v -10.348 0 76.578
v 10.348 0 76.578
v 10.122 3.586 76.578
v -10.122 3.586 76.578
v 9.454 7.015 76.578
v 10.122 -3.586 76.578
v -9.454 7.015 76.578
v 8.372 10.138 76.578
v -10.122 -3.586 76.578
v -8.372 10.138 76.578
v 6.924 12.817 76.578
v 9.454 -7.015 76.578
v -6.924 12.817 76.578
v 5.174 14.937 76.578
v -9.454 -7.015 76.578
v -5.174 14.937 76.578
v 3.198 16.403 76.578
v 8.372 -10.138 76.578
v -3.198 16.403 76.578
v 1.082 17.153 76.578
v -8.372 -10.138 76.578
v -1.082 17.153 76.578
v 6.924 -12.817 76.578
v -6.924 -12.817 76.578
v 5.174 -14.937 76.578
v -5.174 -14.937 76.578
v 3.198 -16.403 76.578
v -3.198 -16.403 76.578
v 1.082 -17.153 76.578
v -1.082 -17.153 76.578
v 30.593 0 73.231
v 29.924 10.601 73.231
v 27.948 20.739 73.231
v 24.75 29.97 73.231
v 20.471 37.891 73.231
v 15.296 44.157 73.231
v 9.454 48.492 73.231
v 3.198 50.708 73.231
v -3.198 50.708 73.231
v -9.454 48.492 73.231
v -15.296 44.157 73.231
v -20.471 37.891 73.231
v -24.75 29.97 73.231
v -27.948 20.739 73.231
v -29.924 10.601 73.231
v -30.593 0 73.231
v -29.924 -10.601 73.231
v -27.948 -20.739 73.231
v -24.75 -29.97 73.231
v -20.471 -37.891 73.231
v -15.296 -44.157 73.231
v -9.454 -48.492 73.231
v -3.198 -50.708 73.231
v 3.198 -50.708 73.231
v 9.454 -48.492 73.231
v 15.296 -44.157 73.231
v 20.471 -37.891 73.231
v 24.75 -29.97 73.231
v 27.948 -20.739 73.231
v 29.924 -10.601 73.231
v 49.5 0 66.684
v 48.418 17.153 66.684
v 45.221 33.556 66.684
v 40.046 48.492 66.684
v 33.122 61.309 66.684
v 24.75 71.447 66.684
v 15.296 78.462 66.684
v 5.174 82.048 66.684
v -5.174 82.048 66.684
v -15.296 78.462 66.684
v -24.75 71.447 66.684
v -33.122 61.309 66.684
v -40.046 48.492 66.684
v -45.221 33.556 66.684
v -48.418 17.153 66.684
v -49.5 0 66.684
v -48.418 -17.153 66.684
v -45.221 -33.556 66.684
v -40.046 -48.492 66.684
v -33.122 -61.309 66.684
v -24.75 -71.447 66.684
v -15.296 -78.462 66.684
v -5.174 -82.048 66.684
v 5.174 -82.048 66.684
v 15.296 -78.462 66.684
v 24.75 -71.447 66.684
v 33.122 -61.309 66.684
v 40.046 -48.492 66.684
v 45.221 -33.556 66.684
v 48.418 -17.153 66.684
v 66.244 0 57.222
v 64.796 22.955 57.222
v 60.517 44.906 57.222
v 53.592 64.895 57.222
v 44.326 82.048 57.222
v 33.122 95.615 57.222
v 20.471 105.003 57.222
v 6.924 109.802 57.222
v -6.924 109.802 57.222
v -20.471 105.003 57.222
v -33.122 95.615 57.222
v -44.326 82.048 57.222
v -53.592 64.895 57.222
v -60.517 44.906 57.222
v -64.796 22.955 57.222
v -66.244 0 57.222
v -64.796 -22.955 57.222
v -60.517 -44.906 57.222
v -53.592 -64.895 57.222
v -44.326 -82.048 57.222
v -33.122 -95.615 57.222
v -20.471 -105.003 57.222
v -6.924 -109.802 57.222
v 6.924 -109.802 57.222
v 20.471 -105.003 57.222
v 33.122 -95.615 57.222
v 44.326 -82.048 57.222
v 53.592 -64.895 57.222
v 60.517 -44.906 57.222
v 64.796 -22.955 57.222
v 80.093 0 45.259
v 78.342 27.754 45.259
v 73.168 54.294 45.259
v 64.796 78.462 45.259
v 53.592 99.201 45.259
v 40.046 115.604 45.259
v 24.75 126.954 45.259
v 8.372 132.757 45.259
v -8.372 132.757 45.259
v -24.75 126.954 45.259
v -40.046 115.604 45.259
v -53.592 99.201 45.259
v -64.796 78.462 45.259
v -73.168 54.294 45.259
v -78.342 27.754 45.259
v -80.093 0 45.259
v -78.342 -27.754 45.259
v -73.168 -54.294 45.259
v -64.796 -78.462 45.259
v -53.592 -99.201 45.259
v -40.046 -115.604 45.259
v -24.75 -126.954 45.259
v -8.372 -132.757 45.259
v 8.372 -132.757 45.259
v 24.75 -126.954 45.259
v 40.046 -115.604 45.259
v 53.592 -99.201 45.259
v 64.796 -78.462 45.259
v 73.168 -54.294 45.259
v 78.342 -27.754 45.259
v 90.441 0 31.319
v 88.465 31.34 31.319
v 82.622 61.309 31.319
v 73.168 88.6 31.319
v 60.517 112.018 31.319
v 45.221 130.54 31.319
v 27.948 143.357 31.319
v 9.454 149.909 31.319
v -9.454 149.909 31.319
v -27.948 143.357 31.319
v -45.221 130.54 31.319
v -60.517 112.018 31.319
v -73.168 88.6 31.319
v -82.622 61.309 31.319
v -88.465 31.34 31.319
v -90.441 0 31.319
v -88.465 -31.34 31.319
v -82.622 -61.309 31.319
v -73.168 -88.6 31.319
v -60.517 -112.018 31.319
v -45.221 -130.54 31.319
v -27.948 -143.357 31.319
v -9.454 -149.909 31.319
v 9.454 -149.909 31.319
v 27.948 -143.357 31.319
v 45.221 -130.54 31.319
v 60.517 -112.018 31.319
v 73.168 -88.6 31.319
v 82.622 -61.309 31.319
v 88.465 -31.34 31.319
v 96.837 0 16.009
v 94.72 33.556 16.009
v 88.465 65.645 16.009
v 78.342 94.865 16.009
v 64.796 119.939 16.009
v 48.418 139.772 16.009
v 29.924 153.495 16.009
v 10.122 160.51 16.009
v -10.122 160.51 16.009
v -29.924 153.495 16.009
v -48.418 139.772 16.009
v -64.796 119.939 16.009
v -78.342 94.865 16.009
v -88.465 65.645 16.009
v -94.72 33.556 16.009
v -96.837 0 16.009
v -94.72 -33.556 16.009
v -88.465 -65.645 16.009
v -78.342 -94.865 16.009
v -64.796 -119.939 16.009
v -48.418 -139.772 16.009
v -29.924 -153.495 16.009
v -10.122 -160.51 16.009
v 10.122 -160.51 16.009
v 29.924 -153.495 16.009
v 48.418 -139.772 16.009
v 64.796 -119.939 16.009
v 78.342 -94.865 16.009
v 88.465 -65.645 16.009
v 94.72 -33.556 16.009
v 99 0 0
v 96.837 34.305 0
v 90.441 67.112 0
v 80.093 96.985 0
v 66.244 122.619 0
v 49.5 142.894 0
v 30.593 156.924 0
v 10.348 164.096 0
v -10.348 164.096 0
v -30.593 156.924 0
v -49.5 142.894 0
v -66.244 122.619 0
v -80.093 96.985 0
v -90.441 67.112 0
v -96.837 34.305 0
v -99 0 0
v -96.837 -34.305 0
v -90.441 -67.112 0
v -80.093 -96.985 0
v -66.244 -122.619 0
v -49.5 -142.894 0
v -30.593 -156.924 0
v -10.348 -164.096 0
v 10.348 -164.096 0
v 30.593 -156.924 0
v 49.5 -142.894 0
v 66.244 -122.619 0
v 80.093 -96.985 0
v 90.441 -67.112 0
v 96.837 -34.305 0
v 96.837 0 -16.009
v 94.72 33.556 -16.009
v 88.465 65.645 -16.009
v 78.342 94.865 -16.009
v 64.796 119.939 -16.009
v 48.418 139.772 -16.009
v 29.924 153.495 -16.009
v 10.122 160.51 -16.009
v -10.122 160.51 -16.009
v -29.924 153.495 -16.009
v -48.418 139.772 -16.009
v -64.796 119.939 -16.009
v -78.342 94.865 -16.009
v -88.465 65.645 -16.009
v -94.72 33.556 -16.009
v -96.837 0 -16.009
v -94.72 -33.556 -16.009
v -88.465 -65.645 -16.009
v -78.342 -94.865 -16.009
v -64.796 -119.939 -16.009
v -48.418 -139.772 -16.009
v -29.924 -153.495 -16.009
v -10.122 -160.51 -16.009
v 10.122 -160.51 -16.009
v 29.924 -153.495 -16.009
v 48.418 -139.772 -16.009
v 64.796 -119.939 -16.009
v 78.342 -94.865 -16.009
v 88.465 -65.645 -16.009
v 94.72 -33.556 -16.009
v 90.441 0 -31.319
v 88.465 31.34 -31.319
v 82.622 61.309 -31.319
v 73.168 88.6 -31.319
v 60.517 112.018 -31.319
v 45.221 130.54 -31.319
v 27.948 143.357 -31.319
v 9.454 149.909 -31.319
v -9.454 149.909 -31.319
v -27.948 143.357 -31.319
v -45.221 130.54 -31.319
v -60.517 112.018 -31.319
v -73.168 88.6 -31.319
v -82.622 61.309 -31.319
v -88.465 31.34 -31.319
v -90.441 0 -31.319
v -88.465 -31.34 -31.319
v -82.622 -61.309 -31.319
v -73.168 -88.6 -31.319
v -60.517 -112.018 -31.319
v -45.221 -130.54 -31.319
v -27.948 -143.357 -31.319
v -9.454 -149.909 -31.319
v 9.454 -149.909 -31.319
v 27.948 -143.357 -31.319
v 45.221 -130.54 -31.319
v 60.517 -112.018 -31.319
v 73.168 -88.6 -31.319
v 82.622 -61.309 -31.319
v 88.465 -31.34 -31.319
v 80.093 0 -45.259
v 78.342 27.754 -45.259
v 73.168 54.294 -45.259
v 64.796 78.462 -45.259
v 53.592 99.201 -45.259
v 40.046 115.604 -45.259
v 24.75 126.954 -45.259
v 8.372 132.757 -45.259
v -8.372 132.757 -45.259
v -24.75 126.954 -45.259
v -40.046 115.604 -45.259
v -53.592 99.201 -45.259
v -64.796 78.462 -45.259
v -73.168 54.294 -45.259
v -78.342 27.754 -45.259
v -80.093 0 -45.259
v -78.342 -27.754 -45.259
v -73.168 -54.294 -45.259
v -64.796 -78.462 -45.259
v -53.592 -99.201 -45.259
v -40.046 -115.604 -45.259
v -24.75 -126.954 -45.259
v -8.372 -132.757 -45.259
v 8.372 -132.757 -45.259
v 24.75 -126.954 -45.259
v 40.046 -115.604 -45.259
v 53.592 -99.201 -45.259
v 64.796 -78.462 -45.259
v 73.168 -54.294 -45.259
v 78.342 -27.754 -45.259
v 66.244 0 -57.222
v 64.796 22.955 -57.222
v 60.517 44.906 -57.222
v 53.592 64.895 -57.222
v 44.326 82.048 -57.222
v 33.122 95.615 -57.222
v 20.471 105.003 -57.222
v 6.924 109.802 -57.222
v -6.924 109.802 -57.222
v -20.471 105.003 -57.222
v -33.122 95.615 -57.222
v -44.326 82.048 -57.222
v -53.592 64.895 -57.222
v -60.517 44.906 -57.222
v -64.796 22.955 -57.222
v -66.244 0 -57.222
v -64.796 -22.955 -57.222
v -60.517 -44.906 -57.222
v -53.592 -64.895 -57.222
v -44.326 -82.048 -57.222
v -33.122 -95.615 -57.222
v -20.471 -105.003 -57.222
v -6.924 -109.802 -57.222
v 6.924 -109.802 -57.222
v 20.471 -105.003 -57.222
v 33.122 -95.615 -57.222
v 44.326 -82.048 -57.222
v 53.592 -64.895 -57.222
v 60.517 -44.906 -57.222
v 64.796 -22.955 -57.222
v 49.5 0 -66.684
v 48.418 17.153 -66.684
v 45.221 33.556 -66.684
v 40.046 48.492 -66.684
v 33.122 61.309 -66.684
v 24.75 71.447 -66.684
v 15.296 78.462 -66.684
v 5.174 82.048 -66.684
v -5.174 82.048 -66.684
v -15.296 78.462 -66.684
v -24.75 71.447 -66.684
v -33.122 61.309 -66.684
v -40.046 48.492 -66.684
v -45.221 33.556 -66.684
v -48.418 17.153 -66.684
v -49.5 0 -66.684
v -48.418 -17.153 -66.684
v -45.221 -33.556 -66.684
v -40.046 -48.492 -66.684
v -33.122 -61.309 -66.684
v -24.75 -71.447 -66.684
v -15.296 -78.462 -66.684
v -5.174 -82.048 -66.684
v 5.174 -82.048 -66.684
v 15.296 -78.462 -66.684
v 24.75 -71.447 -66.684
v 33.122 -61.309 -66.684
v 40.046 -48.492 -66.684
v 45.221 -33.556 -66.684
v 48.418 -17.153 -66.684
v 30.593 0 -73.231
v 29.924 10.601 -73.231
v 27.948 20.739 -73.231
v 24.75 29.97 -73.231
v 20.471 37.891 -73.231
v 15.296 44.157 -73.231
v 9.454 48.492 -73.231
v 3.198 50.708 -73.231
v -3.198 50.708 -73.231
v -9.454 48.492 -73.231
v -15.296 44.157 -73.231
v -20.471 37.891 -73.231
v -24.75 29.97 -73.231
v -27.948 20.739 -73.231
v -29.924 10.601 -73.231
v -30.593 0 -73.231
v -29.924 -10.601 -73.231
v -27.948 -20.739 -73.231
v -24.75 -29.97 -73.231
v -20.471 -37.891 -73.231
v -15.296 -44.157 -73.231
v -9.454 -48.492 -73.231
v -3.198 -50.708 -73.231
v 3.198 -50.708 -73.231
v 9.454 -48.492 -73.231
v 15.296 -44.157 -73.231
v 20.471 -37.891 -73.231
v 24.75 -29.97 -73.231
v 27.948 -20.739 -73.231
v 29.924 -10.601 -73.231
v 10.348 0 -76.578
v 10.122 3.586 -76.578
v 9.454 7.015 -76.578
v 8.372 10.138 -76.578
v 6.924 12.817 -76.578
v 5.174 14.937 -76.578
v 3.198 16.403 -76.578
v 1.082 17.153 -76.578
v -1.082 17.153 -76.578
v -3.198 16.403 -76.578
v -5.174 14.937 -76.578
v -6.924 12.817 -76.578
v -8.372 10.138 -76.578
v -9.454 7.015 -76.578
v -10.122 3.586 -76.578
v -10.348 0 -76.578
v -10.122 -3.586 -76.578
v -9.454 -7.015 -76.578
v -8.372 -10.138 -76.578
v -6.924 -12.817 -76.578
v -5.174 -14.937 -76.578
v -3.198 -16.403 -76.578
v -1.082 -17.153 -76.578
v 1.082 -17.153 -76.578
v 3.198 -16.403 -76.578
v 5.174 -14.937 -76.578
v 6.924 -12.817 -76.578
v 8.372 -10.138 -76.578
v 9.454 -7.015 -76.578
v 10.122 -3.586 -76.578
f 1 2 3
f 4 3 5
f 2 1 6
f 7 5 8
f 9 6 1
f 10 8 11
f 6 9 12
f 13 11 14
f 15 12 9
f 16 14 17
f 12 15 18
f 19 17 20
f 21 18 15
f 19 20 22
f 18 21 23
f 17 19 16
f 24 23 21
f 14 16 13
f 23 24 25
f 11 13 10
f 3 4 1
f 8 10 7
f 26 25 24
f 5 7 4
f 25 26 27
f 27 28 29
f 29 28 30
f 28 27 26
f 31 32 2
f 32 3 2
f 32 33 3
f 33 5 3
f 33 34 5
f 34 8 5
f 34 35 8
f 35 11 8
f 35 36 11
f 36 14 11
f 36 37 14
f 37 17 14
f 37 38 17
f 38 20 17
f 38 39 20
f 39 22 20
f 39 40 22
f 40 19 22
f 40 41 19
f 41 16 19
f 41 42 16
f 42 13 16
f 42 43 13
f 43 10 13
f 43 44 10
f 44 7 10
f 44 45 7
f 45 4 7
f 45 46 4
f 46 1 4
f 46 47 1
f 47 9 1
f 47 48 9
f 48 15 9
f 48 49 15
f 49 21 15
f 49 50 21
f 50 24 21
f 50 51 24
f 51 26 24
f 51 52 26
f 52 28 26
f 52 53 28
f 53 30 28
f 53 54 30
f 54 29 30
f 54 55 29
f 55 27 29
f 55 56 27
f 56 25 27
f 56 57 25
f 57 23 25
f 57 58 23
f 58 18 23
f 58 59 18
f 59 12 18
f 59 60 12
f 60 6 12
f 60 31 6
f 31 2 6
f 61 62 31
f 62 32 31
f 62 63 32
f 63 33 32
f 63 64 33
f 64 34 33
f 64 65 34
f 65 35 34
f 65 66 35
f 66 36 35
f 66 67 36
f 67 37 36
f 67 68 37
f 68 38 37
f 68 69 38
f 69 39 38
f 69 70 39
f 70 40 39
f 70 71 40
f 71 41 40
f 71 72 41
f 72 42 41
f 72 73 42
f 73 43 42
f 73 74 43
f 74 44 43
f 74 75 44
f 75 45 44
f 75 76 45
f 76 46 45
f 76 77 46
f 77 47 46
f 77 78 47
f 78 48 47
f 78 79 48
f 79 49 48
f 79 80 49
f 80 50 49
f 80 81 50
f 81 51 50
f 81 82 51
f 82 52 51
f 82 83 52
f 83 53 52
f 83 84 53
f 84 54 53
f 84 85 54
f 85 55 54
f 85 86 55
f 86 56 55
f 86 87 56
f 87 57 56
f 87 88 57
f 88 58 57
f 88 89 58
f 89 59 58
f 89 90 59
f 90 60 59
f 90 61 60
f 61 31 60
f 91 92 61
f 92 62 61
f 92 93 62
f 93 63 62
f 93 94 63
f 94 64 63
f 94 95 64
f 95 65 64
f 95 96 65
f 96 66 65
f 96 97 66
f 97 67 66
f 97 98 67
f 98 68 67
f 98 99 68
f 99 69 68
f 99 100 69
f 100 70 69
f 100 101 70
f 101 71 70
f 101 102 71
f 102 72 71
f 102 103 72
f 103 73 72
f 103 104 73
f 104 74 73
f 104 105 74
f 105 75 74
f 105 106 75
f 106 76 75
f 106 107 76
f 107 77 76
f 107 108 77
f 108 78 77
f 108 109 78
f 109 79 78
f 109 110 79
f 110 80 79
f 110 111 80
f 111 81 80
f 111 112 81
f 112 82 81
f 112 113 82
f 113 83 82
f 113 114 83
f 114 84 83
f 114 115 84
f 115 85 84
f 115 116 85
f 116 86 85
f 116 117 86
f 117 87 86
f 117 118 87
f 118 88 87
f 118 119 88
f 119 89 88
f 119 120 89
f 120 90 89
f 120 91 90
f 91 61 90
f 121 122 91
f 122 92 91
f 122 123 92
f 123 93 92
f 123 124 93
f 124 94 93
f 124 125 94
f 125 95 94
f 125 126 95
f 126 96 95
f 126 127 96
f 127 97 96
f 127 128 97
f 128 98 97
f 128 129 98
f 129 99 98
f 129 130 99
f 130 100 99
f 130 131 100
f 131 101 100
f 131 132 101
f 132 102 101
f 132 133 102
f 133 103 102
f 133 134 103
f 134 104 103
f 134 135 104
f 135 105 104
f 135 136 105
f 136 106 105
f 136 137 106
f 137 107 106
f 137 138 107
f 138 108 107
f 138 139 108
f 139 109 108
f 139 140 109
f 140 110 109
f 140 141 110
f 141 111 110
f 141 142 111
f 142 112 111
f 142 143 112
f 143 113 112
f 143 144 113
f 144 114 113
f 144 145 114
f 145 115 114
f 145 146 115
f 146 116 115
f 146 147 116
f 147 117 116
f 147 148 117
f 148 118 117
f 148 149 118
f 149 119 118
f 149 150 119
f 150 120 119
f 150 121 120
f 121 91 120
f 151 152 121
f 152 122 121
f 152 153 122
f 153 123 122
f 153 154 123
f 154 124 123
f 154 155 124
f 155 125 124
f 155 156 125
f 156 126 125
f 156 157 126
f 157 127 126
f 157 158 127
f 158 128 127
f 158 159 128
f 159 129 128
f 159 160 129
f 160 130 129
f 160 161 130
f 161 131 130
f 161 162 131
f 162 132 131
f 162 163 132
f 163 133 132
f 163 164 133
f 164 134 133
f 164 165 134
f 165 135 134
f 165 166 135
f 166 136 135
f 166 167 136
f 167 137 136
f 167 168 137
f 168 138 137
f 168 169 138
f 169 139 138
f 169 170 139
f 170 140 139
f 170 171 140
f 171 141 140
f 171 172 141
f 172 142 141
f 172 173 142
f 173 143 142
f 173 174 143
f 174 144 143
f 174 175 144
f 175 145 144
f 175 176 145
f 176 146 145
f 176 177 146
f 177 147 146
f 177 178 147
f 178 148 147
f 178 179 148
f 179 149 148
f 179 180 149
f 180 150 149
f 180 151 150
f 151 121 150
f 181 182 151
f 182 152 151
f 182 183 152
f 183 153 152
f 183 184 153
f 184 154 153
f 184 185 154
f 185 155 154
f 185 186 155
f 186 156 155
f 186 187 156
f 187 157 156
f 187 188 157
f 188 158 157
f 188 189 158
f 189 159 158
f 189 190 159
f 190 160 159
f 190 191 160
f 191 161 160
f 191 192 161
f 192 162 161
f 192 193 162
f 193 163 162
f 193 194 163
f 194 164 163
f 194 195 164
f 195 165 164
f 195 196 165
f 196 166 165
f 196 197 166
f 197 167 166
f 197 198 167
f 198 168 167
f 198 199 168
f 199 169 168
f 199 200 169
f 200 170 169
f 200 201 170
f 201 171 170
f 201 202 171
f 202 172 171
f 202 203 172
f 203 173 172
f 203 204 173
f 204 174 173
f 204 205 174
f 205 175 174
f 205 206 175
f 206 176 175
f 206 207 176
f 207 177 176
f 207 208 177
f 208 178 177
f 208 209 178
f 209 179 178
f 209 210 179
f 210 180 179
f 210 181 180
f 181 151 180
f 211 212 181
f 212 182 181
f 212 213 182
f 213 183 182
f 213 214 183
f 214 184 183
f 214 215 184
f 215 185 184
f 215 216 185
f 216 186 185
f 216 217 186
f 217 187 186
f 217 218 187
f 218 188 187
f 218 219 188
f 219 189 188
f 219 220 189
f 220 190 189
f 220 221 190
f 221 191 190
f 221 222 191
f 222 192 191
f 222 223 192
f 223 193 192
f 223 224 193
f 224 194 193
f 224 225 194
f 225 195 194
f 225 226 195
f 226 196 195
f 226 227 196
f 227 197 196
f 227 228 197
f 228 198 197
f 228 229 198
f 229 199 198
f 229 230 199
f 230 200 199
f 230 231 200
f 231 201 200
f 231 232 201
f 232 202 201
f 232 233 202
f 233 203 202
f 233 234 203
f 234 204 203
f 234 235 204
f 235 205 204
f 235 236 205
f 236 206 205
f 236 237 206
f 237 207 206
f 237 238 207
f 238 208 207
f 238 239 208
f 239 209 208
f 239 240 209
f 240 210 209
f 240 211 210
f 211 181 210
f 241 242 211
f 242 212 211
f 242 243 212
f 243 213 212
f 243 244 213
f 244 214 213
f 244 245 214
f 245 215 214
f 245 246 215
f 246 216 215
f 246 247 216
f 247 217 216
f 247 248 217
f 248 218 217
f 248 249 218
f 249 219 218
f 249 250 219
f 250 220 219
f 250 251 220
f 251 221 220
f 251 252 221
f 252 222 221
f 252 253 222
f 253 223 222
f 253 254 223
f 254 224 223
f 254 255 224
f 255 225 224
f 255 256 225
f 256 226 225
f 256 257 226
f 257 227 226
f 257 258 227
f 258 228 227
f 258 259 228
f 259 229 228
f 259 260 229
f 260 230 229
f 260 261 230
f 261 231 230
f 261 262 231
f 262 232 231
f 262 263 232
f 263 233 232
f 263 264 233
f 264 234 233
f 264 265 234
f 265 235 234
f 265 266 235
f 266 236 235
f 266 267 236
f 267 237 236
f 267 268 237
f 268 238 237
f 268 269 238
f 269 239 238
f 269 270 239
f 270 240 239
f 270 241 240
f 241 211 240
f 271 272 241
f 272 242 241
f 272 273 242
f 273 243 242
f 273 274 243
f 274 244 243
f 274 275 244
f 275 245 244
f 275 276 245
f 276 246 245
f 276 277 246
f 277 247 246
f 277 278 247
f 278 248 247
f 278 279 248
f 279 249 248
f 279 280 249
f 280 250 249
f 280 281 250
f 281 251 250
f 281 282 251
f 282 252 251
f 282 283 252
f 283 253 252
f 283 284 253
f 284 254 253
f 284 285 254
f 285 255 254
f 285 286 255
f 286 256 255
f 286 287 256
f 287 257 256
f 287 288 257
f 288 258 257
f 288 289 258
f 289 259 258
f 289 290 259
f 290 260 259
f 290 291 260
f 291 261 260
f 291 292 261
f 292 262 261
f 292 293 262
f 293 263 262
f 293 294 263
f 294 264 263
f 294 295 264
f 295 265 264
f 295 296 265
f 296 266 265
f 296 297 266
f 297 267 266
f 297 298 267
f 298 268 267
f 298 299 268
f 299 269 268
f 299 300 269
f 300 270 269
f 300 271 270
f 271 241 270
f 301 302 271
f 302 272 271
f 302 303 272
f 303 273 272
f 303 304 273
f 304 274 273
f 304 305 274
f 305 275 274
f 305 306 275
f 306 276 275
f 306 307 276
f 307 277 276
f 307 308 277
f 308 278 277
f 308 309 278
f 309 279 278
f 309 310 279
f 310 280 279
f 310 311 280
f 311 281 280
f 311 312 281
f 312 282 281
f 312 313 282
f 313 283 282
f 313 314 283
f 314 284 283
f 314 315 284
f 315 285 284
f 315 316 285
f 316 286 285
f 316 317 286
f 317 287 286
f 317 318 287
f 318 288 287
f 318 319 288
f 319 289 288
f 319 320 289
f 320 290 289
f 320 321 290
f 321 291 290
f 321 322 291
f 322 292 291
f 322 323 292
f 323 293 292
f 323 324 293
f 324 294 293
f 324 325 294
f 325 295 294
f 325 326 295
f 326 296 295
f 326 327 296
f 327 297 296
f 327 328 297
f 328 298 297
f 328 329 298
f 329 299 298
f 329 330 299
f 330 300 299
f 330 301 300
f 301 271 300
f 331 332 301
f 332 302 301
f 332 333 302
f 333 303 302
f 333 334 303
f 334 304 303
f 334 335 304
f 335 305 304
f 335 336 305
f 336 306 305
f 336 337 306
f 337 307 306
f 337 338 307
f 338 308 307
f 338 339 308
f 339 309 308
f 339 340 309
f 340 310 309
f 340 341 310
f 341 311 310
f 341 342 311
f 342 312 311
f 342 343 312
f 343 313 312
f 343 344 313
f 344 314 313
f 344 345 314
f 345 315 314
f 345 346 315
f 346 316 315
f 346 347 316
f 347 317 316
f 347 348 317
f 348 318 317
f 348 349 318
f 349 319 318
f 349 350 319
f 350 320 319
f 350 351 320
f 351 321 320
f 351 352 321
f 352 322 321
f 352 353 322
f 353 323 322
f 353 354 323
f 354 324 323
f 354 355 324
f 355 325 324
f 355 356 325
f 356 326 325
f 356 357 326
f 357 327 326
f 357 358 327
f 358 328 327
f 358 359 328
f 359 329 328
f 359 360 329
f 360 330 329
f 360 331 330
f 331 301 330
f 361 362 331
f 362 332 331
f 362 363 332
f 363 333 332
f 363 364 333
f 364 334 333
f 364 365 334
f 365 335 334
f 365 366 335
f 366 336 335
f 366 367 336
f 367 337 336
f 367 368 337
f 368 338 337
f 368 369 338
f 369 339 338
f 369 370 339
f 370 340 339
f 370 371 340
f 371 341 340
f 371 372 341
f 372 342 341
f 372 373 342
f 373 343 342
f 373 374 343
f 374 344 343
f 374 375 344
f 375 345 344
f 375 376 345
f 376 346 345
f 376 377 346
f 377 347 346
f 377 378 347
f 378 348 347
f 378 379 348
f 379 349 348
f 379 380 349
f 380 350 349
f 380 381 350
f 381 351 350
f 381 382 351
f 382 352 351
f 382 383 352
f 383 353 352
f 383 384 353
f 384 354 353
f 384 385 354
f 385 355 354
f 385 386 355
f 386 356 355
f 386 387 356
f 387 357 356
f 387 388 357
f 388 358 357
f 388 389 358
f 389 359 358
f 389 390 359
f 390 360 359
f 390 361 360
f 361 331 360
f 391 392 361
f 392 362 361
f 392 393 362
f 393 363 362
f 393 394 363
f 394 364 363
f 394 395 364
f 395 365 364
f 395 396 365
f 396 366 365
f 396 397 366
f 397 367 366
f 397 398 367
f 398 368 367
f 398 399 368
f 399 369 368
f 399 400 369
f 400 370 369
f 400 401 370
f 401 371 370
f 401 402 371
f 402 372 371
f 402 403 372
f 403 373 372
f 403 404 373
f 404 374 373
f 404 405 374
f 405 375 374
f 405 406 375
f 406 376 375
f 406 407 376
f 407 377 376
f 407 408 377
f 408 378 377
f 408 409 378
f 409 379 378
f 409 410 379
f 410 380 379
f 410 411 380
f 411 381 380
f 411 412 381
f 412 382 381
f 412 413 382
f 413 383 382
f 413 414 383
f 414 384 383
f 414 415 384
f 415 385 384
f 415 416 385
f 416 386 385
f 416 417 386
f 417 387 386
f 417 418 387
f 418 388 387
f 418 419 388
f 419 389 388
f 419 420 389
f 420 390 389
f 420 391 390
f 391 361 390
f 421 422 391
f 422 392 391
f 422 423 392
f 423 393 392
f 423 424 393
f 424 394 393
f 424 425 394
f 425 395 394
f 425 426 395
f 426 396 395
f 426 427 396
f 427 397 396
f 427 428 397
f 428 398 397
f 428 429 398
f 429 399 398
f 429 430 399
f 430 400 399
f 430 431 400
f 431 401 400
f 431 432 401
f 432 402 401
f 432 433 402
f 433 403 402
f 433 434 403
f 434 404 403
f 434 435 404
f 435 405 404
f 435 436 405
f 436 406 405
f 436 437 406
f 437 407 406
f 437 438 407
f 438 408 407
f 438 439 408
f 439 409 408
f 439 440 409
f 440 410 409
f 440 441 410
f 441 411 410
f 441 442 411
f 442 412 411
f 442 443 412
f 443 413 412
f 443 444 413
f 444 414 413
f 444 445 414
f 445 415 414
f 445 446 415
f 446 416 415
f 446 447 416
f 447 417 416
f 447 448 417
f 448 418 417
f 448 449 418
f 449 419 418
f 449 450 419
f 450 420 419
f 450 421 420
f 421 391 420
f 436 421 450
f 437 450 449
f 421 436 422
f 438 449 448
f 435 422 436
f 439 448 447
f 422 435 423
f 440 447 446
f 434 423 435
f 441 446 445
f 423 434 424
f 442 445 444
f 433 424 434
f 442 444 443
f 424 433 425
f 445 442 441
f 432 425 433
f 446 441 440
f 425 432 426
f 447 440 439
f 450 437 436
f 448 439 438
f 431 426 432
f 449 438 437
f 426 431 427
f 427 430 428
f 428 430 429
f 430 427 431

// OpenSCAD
// Generated by SolidPython 1.0.1 on 2020-07-29 00:46:49


scale(v = [9, 15, 7]) {
	sphere(r = 11);
}
/***********************************************
*********      SolidPython code:      **********
************************************************
 
# import packages: SolidPython
from solid import *
from solid.utils import *
from itertools import chain, combinations, permutations


class Resize:

    def __init__(self, scad_file):
        self.scad_file = scad_file
        #self.scad_file = import_scad(scad_file)
        # cone/cylinder param:
        self.r1 = 0
        self.r2 = 0
        self.h = 0
        # rectangular prism param:
        self.w = 0
        self.l = 0
        # ellipse param:
        self.r = 0

    # import OpenScad code (file name corresponds to shape)


    # classify shape + parameters
    def assign(self, param1, param2, param3):
        if self.scad_file == 'cone.scad':
            self.r1 = param1
            self.r2 = param2
            self.h = param3
        elif self.scad_file == 'cylinder.scad':
            self.r1 = param1
            self.r2 = param2
            self.h = param3
        elif self.scad_file == 'rectangularPrism.scad':
            self.h = param1
            self.l = param2
            self.w = param3
        else:
            self.r = param1
            self.h = param2

    # resize parameters
    def iterate(self):
        x = range(3, 20, 2)
        i = 1
        if self.scad_file == 'cone.scad':
            tempList = list(permutations(x, 2))
            for temp in tempList:
                param1 = temp[0]
                param2 = temp[1]
                filepath = 'produced_scad_files/' + 'cone' + str(param1) + '_' + str(param2) + '_' + '.scad'
                scad_render_to_file(cylinder(h=param1, r1=param2, r2=0), filepath)

        elif self.scad_file == 'cylinder.scad':
            tempList = list(permutations(x, 3))
            for temp in tempList:
                param1 = temp[0]
                param2 = temp[1]
                filepath = 'produced_scad_files/' + 'cylinder' + str(param1) + '_' + str(param2) + '_' + '.scad'
                scad_render_to_file(cylinder(h=param1, r1=param2, r2=param2), filepath)

        elif self.scad_file == 'rectangularPrism.scad':
            tempList = list(permutations(x, 3))
            for temp in tempList:
                param1 = temp[0]
                param2 = temp[1]
                param3 = temp[2]
                filepath = 'produced_scad_files/' + 'rectangularPrism' + str(param1) + '_' + str(param2) + '_' + str(
                    param3) + '.scad'
                scad_render_to_file(cube(size=(param1, param2, param3)), filepath)

        elif self.scad_file == 'ellipse.scad':
            tempList = list(permutations(x, 4))
            for temp in tempList:
                param1 = temp[0]
                param2 = temp[1]
                param3 = temp[2]
                param4 = temp[3]
                filepath = 'produced_scad_files/' + 'ellipse' + str(param1) + '_' + str(param2) + '_' + str(param3) + '_' + str(param4) + '.scad'
                scad_render_to_file(scale([param1, param2, param3])(sphere(r=param4)), filepath)

    def render_to_scadfile(self):
        scad_render_to_file(scad, 'example.scad') 
 
************************************************/
